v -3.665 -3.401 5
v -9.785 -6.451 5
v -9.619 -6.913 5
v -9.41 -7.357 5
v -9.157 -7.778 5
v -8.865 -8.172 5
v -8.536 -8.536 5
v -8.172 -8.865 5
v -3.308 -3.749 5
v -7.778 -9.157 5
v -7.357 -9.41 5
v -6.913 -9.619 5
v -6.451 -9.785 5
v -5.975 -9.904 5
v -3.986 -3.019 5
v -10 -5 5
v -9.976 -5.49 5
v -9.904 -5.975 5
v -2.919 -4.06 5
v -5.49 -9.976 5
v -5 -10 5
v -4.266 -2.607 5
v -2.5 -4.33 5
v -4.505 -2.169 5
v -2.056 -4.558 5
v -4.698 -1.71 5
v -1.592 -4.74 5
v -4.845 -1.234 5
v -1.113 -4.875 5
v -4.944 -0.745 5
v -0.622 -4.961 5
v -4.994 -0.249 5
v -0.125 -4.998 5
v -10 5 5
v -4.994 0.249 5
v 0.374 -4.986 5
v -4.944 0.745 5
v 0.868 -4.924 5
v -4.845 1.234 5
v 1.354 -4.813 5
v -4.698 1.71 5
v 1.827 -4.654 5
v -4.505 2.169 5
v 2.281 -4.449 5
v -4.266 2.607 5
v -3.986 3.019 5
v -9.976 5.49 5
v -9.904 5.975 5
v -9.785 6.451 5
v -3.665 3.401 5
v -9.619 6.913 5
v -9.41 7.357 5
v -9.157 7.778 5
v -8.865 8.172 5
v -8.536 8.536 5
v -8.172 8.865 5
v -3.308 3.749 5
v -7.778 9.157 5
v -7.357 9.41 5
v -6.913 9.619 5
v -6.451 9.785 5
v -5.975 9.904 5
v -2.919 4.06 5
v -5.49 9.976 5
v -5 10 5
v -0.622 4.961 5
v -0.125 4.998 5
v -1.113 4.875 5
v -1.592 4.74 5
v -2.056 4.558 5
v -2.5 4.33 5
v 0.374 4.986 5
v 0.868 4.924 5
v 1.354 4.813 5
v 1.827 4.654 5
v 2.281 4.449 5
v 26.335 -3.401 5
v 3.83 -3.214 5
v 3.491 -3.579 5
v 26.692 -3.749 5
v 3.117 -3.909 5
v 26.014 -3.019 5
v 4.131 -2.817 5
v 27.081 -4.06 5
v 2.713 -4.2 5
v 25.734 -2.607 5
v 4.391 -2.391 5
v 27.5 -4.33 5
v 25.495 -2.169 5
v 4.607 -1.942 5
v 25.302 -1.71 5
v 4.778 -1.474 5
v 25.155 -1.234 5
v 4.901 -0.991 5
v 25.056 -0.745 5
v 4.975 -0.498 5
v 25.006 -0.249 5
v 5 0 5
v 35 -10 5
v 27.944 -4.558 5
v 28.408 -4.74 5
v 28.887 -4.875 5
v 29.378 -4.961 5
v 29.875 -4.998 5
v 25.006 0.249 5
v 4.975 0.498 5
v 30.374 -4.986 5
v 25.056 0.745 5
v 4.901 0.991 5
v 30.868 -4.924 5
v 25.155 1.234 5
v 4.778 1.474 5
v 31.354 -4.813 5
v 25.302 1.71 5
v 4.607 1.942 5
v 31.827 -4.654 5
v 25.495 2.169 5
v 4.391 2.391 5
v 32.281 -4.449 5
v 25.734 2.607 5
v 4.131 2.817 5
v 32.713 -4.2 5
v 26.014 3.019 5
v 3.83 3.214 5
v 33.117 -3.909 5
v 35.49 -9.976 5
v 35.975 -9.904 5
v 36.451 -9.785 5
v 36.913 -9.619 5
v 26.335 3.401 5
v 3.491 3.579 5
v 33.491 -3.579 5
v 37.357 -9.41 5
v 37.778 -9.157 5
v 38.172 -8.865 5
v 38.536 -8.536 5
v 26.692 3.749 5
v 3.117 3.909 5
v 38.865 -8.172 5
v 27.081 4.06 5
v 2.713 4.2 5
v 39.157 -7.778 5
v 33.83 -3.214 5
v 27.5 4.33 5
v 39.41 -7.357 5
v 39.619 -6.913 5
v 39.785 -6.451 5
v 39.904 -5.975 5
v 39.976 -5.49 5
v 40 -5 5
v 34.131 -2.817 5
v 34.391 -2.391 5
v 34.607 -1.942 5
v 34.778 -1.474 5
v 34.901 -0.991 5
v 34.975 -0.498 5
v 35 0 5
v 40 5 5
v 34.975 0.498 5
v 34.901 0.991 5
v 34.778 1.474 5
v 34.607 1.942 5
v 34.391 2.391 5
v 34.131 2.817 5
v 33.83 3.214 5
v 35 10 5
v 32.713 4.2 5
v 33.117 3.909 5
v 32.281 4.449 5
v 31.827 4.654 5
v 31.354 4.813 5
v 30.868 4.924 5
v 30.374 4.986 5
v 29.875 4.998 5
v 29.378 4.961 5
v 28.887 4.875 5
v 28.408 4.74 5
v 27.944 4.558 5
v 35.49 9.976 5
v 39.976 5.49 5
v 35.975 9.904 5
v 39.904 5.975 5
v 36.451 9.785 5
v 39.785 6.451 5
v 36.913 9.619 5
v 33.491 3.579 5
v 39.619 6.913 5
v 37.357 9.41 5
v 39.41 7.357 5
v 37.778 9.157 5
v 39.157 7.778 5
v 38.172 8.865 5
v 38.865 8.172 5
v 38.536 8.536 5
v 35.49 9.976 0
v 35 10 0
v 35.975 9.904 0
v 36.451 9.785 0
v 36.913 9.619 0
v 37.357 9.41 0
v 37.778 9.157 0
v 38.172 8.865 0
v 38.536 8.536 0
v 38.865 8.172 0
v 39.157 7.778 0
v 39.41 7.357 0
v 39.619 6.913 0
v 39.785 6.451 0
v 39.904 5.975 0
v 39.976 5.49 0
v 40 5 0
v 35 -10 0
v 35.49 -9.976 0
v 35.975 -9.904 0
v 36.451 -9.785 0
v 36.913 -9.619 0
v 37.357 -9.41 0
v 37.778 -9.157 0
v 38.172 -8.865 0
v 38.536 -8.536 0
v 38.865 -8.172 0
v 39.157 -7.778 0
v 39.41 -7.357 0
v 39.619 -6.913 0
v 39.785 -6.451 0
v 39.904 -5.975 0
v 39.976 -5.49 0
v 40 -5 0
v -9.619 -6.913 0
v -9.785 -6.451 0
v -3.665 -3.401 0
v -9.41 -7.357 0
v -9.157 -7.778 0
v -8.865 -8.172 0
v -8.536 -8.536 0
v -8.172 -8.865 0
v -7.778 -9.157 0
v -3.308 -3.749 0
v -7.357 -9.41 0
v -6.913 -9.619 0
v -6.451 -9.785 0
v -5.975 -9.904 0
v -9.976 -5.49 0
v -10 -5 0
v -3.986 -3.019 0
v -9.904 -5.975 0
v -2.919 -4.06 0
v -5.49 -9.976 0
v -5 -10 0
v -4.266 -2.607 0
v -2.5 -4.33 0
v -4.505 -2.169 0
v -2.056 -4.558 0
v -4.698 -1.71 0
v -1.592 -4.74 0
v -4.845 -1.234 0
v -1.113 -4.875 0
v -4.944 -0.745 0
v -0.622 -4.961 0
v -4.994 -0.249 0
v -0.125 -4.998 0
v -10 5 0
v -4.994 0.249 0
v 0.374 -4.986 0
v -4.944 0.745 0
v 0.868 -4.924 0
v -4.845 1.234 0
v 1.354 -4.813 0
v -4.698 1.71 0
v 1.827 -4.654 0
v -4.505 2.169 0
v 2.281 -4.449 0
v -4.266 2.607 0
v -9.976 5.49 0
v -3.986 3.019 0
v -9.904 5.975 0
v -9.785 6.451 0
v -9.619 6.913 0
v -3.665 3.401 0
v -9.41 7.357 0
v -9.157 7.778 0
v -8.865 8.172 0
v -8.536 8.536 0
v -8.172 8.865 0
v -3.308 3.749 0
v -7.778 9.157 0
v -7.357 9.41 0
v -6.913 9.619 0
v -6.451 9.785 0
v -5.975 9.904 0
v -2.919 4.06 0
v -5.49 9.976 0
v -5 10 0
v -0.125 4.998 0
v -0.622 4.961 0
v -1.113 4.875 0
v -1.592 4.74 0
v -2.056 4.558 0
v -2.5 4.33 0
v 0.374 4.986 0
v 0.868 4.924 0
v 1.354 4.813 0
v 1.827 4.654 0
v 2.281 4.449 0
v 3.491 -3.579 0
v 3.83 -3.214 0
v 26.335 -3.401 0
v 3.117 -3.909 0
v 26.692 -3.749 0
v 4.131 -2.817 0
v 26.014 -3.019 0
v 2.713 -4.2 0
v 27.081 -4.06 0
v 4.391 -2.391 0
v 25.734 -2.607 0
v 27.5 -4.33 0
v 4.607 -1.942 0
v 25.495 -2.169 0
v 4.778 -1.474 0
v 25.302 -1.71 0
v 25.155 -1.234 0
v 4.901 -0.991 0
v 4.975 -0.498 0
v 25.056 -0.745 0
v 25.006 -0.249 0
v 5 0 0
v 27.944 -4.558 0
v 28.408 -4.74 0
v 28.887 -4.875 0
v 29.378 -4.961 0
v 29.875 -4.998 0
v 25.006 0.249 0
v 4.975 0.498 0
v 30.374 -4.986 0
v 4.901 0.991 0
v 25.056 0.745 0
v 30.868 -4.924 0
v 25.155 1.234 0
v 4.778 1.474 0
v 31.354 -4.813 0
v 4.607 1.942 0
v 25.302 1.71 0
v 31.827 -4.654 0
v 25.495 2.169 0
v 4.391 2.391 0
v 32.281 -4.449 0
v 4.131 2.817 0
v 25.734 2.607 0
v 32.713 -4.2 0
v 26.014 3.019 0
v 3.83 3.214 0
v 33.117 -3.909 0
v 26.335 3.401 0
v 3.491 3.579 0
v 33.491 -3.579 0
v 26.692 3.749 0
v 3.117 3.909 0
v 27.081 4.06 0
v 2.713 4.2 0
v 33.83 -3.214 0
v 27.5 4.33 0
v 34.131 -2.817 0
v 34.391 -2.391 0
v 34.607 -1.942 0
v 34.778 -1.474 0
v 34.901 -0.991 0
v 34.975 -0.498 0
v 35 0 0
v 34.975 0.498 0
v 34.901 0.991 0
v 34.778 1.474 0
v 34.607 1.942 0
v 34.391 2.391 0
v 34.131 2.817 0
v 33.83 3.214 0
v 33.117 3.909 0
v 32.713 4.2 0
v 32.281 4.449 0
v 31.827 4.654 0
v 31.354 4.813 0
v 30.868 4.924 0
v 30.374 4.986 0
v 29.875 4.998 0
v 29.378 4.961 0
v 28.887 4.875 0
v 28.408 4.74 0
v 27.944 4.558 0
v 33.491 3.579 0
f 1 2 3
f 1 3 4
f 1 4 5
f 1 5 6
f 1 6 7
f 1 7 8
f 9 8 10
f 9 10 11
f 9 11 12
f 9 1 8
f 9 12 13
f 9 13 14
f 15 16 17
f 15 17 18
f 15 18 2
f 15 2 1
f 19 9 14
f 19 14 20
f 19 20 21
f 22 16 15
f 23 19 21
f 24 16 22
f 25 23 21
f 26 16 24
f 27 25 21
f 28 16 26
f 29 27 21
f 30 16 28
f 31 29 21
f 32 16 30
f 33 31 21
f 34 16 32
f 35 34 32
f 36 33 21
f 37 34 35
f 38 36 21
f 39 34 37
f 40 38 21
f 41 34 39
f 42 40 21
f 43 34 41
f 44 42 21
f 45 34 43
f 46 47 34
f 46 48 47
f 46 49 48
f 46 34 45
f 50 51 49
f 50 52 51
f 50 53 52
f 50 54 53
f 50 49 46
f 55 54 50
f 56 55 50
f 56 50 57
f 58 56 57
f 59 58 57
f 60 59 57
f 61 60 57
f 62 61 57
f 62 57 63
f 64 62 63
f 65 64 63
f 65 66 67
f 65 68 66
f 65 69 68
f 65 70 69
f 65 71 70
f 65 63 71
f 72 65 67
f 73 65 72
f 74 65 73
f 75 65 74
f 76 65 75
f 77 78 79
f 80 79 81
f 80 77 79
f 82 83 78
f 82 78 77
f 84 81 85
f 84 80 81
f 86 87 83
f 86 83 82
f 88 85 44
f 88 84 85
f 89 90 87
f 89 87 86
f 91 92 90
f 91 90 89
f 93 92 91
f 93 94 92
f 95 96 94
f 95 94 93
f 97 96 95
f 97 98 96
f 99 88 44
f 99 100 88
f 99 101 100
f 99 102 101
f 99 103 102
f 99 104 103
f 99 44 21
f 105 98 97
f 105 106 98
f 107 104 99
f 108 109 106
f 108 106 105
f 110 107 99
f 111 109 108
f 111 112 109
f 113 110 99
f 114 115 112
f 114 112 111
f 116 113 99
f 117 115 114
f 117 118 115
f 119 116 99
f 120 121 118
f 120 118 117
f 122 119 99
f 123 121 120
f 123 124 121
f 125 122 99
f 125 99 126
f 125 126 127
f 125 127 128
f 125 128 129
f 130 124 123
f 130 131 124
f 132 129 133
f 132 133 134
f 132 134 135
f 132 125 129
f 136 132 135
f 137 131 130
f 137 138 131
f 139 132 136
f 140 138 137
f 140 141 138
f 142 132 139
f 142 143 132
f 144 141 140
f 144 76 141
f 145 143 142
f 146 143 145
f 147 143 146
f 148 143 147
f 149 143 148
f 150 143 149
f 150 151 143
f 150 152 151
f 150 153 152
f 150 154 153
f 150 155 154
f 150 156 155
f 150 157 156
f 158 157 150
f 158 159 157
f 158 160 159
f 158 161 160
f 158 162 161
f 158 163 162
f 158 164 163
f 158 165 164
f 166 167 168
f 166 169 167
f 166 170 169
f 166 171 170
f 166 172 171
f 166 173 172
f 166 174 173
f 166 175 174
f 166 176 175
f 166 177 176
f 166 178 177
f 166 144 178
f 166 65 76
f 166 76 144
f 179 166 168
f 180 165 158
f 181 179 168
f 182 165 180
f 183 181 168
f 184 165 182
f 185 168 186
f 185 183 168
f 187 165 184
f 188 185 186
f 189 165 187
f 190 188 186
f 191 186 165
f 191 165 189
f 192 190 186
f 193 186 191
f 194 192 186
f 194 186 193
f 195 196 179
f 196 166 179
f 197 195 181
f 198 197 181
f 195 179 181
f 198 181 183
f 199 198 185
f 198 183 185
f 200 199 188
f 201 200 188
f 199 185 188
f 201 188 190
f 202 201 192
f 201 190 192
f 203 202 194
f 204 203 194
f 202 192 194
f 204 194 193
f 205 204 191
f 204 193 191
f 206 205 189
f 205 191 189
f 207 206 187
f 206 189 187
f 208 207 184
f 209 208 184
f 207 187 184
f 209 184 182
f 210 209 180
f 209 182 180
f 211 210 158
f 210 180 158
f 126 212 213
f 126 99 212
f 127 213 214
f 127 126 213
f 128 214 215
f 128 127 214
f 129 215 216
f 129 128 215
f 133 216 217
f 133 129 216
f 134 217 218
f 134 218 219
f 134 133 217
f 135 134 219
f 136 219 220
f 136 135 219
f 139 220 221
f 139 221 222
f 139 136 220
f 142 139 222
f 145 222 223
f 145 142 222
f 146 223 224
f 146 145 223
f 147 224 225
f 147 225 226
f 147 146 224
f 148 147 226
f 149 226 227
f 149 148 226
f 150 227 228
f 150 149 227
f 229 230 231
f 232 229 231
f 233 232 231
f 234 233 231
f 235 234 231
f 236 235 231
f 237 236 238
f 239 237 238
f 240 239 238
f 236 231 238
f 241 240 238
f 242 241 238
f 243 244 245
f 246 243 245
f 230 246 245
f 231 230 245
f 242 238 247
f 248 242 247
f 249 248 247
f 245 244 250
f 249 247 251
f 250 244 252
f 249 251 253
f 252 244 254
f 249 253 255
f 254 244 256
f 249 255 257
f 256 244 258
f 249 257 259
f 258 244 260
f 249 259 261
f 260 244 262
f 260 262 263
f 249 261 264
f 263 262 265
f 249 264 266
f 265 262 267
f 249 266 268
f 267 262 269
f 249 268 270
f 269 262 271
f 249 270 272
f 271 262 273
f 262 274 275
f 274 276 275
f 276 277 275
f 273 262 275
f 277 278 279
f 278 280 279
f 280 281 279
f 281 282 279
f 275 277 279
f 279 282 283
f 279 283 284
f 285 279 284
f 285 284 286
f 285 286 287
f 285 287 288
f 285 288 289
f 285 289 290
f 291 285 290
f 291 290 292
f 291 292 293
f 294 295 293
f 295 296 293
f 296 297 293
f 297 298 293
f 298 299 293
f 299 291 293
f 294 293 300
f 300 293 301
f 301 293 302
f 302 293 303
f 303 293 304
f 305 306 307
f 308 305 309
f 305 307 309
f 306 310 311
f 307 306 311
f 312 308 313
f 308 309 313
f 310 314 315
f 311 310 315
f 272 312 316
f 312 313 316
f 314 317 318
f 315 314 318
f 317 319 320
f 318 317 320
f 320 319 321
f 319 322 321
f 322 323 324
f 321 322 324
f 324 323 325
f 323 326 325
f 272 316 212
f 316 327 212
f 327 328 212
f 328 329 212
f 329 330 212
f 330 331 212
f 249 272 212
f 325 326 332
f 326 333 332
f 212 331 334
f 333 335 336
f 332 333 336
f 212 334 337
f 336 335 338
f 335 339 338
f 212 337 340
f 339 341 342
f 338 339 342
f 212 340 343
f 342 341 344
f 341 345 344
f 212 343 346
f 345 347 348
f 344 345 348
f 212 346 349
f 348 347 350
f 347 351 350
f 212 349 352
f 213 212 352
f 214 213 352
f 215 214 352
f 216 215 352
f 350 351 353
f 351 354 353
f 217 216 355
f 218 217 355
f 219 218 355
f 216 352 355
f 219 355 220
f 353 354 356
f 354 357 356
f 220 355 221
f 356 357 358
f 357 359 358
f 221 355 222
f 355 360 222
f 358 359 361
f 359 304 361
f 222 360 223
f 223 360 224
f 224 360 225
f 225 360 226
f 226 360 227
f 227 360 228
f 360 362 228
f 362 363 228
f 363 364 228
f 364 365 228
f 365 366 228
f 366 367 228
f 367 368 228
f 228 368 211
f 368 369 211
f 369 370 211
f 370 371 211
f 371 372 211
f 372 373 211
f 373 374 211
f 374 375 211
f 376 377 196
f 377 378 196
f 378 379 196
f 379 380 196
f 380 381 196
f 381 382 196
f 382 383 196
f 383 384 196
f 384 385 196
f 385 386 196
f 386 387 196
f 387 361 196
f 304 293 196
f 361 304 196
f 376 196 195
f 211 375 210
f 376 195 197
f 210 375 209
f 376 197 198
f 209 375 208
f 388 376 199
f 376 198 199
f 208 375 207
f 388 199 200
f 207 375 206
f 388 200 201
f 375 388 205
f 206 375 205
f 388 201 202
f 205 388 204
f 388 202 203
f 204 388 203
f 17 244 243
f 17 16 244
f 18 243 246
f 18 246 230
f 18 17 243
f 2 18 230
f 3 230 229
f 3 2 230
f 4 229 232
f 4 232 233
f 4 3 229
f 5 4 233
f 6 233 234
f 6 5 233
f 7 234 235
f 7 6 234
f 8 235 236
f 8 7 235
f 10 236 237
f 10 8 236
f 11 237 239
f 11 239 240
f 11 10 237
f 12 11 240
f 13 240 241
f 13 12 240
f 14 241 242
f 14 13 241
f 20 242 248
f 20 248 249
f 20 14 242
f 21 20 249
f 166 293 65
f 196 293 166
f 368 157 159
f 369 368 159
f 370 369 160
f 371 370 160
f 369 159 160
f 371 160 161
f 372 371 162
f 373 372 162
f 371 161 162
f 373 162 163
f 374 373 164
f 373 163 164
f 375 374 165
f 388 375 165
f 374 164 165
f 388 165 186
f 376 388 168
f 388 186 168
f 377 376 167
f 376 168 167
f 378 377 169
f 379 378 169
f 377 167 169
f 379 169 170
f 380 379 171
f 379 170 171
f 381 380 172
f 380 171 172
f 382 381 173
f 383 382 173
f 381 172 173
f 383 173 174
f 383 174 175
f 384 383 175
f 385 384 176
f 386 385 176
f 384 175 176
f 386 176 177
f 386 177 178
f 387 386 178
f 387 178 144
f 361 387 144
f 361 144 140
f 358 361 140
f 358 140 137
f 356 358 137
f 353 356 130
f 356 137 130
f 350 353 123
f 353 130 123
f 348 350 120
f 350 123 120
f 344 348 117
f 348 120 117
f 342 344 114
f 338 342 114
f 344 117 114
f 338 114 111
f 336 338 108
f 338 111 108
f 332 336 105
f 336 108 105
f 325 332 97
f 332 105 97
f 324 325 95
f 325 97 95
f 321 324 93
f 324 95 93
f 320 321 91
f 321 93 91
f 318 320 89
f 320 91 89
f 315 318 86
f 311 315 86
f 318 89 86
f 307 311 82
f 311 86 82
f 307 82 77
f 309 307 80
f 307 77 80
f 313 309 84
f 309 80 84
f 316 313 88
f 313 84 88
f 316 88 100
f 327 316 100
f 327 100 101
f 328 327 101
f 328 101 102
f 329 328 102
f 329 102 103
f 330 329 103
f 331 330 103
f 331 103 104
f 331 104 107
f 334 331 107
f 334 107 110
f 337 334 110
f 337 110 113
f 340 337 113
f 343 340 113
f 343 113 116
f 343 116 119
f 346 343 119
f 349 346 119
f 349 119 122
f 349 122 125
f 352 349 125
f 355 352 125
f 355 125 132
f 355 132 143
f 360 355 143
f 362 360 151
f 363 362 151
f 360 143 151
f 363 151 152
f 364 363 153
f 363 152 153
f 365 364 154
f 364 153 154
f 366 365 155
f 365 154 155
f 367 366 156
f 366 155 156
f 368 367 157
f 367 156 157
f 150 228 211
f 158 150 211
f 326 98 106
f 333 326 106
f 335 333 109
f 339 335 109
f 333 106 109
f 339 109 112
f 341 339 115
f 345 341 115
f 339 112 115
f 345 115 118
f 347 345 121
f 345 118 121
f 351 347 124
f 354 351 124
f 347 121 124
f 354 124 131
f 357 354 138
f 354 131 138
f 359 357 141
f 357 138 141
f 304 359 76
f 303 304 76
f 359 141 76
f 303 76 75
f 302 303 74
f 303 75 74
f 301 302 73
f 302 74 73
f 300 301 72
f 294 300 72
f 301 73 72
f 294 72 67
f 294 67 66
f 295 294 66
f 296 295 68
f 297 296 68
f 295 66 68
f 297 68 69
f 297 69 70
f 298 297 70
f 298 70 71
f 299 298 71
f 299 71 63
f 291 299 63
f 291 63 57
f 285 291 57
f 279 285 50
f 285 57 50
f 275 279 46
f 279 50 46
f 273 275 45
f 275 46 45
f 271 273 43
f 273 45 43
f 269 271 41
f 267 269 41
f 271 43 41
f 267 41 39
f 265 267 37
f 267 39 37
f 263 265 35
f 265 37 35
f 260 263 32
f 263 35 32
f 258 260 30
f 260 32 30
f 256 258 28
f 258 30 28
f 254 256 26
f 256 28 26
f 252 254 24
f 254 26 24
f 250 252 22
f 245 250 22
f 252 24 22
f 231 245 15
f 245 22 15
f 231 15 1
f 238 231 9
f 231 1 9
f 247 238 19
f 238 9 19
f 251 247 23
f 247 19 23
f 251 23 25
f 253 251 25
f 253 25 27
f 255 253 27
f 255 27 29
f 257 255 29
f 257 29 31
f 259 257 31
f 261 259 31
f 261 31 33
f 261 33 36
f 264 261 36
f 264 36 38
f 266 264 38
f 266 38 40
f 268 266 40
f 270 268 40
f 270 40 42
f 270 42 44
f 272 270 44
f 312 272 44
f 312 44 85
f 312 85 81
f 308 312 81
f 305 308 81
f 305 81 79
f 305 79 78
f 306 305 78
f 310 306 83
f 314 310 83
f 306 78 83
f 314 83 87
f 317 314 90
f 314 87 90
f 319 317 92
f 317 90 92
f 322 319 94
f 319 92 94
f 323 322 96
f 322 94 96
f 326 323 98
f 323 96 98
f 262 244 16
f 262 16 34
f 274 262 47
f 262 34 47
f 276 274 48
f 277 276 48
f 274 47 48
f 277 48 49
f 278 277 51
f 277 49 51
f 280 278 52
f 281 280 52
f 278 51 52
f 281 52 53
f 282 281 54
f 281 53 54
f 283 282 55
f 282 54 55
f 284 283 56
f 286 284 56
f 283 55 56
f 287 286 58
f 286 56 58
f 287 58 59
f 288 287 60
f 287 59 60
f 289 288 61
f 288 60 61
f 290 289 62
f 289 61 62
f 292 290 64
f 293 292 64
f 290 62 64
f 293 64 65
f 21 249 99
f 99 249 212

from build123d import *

# Parameters (mm, degrees)
F0_W     = 50
F0_H     = 20
F1_DEPTH = 5
F2_R     = 5
F3_DEPTH = 5
F4_R     = 5
F5_DEPTH = 5
F6_R     = 5


with BuildPart() as f1:
    # F0 (on Top) → F1 (new body)
    with BuildSketch(Plane.XY):
        with Locations((15, 0)):
            Rectangle(F0_W, F0_H)
    extrude(amount=F1_DEPTH)

    # F2 (on face) → F3 (cut, through all)
    with BuildSketch(Plane.XY.offset(5)):
        Circle(F2_R)
    extrude(amount=-F3_DEPTH, mode=Mode.SUBTRACT)

    # F4 (on face) → F5 (cut, through all)
    with BuildSketch(Plane.XY.offset(5)):
        with Locations((30, 0)):
            Circle(F4_R)
    extrude(amount=-F5_DEPTH, mode=Mode.SUBTRACT)

    # F6
    f6_edges = [f1.edges().sort_by_distance(p)[0] for p in [
        (-10, 10, 2.5),
        (-10, -10, 2.5),
        (40, 10, 2.5),
        (40, -10, 2.5),
    ]]
    fillet(f6_edges, radius=F6_R)


solid = f1.part
